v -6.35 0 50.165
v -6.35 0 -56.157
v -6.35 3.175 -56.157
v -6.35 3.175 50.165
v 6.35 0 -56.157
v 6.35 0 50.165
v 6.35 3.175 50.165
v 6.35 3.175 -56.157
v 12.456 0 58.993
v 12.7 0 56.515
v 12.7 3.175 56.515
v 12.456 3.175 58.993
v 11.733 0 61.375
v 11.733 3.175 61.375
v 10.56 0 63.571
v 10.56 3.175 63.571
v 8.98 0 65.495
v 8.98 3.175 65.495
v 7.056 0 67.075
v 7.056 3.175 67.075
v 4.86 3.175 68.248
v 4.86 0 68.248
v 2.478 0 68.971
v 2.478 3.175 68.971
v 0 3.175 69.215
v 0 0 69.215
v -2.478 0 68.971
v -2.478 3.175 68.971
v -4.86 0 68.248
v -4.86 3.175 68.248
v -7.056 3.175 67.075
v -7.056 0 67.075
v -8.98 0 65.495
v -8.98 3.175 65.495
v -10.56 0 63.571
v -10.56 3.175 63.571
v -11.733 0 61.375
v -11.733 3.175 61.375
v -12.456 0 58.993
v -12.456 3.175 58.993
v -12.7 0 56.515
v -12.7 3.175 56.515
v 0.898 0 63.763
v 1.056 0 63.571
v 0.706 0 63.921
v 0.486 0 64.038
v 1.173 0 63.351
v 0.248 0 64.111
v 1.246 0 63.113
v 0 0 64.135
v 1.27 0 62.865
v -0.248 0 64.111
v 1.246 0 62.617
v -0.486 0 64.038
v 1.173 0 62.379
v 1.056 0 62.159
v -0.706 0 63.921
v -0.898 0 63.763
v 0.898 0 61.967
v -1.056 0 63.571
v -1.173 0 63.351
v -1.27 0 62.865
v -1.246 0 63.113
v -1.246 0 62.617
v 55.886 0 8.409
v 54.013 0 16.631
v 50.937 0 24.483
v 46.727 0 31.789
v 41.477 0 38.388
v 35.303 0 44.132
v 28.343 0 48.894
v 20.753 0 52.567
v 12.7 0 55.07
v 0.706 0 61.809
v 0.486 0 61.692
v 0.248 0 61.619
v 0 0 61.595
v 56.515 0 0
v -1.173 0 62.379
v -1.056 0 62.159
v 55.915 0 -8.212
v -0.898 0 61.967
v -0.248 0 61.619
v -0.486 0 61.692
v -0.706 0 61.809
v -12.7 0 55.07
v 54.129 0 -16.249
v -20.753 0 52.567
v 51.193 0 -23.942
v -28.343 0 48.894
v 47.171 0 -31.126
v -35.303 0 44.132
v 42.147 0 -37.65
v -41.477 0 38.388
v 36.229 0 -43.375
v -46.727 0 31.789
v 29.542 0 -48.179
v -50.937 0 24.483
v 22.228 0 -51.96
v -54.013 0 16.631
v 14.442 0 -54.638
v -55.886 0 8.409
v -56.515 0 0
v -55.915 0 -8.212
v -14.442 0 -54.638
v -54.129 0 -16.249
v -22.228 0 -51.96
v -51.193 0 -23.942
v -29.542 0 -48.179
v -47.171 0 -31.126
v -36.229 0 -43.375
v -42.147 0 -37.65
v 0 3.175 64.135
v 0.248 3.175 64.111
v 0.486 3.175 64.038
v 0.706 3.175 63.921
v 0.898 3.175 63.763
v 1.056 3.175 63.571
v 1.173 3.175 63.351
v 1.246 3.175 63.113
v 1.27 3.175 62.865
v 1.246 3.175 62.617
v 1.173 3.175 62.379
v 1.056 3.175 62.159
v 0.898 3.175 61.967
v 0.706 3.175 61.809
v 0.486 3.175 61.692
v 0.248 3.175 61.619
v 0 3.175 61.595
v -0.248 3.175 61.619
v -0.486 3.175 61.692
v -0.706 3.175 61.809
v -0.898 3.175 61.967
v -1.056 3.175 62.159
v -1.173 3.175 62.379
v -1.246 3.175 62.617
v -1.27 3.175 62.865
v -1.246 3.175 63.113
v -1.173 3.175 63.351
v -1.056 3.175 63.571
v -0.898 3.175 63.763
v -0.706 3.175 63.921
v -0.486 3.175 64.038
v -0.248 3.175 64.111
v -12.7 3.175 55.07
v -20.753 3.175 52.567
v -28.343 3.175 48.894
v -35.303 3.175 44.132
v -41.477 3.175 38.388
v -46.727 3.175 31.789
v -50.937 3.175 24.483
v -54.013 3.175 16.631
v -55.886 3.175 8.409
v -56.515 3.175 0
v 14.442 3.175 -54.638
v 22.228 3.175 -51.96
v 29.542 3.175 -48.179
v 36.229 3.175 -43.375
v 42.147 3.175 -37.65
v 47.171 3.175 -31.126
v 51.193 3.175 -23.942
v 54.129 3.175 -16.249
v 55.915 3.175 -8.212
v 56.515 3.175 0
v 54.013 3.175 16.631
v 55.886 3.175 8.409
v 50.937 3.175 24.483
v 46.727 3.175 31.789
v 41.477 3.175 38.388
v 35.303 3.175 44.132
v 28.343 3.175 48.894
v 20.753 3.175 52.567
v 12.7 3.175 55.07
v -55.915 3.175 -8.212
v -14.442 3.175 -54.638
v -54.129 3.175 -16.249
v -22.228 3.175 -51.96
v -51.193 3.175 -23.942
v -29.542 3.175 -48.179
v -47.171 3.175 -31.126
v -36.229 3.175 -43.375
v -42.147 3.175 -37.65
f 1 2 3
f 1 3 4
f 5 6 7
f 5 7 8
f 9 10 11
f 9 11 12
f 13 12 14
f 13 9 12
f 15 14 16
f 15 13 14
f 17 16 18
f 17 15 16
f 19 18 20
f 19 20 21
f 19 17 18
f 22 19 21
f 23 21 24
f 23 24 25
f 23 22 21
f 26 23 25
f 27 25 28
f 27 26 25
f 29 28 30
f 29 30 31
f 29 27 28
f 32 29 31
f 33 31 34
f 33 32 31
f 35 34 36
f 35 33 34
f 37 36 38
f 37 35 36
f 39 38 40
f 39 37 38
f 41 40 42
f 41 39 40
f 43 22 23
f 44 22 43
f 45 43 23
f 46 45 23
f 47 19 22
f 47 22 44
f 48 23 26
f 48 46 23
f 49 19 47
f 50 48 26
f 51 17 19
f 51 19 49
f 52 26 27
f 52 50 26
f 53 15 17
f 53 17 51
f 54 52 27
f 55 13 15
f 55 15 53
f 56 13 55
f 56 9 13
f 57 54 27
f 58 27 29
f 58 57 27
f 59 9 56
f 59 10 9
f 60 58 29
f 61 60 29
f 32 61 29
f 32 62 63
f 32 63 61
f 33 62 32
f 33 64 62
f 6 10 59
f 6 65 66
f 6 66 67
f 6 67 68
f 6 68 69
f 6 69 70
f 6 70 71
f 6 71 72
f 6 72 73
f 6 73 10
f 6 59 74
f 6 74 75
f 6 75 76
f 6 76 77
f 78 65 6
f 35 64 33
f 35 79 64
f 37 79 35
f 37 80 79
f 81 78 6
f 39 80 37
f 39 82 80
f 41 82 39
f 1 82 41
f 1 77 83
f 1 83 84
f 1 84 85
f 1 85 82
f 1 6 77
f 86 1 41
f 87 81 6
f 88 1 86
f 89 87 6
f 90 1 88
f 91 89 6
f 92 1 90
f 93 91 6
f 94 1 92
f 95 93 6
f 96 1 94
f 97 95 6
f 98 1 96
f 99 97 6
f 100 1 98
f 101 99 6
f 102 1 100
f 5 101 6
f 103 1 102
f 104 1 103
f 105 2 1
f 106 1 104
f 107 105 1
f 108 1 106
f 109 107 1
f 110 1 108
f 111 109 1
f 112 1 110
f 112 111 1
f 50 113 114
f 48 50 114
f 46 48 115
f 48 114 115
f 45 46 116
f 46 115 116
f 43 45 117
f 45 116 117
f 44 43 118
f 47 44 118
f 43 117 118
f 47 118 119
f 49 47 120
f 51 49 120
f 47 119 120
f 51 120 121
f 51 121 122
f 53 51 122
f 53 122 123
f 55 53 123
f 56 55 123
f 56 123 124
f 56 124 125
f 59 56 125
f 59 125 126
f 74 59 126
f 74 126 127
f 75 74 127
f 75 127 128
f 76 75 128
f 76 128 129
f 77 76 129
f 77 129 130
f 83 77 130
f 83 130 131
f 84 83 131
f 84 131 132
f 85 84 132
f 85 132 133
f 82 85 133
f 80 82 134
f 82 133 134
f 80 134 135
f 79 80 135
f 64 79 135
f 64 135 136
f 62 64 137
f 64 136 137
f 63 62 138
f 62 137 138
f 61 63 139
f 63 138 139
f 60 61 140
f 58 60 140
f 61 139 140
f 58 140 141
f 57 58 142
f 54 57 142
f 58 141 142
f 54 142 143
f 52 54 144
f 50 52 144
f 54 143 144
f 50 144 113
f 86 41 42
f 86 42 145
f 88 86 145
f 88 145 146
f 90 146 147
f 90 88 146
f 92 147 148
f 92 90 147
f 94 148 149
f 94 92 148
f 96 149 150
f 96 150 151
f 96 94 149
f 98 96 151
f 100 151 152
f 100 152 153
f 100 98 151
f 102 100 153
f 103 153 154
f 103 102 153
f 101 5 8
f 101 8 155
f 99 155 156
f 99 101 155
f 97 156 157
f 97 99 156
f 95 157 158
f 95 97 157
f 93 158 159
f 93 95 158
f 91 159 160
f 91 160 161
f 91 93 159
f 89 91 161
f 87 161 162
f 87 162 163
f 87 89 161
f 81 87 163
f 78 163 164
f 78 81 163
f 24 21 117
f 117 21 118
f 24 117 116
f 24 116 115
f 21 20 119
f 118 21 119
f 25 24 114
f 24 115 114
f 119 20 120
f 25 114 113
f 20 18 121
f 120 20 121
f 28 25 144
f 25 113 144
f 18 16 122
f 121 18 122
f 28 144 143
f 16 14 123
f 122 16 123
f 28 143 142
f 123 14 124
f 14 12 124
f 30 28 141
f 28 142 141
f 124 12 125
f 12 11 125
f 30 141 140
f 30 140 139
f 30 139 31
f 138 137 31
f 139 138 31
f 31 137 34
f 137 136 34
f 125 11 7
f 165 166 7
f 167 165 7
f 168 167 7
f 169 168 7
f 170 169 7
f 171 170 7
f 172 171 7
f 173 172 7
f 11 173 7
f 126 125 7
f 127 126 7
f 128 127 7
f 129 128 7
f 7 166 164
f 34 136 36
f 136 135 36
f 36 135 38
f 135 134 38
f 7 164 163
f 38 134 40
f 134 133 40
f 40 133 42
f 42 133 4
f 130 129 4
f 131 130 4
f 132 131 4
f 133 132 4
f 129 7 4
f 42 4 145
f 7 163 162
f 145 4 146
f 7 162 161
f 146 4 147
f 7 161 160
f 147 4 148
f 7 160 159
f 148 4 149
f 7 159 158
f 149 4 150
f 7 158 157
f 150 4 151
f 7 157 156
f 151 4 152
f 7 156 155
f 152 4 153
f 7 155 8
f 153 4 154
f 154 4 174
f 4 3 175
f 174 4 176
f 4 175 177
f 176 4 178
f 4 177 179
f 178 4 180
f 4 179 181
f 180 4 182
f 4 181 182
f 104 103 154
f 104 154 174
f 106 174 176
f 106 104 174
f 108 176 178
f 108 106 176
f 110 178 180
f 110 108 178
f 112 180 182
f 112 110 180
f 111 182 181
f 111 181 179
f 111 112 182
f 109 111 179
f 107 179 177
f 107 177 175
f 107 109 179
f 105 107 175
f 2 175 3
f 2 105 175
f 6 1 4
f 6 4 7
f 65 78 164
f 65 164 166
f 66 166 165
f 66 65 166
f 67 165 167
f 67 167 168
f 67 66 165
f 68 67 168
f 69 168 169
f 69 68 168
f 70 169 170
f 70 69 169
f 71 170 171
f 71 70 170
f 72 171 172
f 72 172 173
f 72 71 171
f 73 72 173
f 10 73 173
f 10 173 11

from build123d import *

# Parameters (mm, degrees)
BOSS_EXTRUDE1_DEPTH = 3.175
SKETCH3_R           = 1.27
CUT_EXTRUDE1_DEPTH  = 90.413321575
CUT_EXTRUDE2_START  = -3.175
CUT_EXTRUDE2_DEPTH  = 3.175


# Read off the part's stored shape, not the designer's step: Cut-Extrude2
with BuildPart() as part:
    # Sketch2 → Boss-Extrude1 (new body)
    with BuildSketch(Plane(origin=(0, 0, 0), x_dir=(1, 0, 0), z_dir=(0, 1, 0))):
        with BuildLine():
            Line((6.35, 56.515), (56.515, 56.515))
            Line((56.515, 56.515), (56.515, -56.515))
            Line((56.515, -56.515), (12.7, -56.515))
            ThreePointArc((12.7, -56.515), (0, -69.215), (-12.7, -56.515))
            Line((-12.7, -56.515), (-56.515, -56.515))
            Line((-56.515, -56.515), (-56.515, 56.515))
            Line((-56.515, 56.515), (-6.35, 56.515))
            Line((-6.35, 56.515), (-6.35, -50.165))
            Line((-6.35, -50.165), (6.35, -50.165))
            Line((6.35, -50.165), (6.35, 56.515))
        make_face()
    extrude(amount=BOSS_EXTRUDE1_DEPTH)

    # Sketch3 → Cut-Extrude1 (cut, through all)
    with BuildSketch(Plane(origin=(0, 3.175, 0), x_dir=(1, 0, 0), z_dir=(0, 1, 0))):
        with Locations(Location((0, -62.865, 0), (0, 0, 270))):
            Circle(SKETCH3_R)
    extrude(amount=-CUT_EXTRUDE1_DEPTH, mode=Mode.SUBTRACT)

    # Cut-Extrude2 outline → Cut-Extrude2 (cut)
    with BuildSketch(Plane(origin=(0, 3.175, 0), x_dir=(1, 0, 0), z_dir=(0, 1, 0)).offset(CUT_EXTRUDE2_START)):
        with BuildLine():
            ThreePointArc((6.35, 56.157125327), (42.147452325, 37.650199037), (56.515, 0))
            Line((56.515, 0), (56.515, 56.515))
            Line((56.515, 56.515), (6.35, 56.515))
            Line((6.35, 56.515), (6.35, 56.157125327))
        make_face()
        with BuildLine():
            ThreePointArc((56.515, 0), (44.224912238, -35.186678765), (12.7, -55.069548981))
            Line((12.7, -55.069548981), (12.7, -56.515))
            Line((12.7, -56.515), (56.515, -56.515))
            Line((56.515, -56.515), (56.515, 0))
        make_face()
        with BuildLine():
            ThreePointArc((-12.7, -55.069548981), (-44.224912408, -35.186678552), (-56.515, 5.45e-07))
            Line((-56.515, 5.45e-07), (-56.515, -56.515))
            Line((-56.515, -56.515), (-12.7, -56.515))
            Line((-12.7, -56.515), (-12.7, -55.069548981))
        make_face()
        with BuildLine():
            ThreePointArc((-56.515, 5.45e-07), (-42.147452144, 37.65019924), (-6.35, 56.157125327))
            Line((-6.35, 56.157125327), (-6.35, 56.515))
            Line((-6.35, 56.515), (-56.515, 56.515))
            Line((-56.515, 56.515), (-56.515, 5.45e-07))
        make_face()
    extrude(amount=CUT_EXTRUDE2_DEPTH, mode=Mode.SUBTRACT)


solid = part.part
